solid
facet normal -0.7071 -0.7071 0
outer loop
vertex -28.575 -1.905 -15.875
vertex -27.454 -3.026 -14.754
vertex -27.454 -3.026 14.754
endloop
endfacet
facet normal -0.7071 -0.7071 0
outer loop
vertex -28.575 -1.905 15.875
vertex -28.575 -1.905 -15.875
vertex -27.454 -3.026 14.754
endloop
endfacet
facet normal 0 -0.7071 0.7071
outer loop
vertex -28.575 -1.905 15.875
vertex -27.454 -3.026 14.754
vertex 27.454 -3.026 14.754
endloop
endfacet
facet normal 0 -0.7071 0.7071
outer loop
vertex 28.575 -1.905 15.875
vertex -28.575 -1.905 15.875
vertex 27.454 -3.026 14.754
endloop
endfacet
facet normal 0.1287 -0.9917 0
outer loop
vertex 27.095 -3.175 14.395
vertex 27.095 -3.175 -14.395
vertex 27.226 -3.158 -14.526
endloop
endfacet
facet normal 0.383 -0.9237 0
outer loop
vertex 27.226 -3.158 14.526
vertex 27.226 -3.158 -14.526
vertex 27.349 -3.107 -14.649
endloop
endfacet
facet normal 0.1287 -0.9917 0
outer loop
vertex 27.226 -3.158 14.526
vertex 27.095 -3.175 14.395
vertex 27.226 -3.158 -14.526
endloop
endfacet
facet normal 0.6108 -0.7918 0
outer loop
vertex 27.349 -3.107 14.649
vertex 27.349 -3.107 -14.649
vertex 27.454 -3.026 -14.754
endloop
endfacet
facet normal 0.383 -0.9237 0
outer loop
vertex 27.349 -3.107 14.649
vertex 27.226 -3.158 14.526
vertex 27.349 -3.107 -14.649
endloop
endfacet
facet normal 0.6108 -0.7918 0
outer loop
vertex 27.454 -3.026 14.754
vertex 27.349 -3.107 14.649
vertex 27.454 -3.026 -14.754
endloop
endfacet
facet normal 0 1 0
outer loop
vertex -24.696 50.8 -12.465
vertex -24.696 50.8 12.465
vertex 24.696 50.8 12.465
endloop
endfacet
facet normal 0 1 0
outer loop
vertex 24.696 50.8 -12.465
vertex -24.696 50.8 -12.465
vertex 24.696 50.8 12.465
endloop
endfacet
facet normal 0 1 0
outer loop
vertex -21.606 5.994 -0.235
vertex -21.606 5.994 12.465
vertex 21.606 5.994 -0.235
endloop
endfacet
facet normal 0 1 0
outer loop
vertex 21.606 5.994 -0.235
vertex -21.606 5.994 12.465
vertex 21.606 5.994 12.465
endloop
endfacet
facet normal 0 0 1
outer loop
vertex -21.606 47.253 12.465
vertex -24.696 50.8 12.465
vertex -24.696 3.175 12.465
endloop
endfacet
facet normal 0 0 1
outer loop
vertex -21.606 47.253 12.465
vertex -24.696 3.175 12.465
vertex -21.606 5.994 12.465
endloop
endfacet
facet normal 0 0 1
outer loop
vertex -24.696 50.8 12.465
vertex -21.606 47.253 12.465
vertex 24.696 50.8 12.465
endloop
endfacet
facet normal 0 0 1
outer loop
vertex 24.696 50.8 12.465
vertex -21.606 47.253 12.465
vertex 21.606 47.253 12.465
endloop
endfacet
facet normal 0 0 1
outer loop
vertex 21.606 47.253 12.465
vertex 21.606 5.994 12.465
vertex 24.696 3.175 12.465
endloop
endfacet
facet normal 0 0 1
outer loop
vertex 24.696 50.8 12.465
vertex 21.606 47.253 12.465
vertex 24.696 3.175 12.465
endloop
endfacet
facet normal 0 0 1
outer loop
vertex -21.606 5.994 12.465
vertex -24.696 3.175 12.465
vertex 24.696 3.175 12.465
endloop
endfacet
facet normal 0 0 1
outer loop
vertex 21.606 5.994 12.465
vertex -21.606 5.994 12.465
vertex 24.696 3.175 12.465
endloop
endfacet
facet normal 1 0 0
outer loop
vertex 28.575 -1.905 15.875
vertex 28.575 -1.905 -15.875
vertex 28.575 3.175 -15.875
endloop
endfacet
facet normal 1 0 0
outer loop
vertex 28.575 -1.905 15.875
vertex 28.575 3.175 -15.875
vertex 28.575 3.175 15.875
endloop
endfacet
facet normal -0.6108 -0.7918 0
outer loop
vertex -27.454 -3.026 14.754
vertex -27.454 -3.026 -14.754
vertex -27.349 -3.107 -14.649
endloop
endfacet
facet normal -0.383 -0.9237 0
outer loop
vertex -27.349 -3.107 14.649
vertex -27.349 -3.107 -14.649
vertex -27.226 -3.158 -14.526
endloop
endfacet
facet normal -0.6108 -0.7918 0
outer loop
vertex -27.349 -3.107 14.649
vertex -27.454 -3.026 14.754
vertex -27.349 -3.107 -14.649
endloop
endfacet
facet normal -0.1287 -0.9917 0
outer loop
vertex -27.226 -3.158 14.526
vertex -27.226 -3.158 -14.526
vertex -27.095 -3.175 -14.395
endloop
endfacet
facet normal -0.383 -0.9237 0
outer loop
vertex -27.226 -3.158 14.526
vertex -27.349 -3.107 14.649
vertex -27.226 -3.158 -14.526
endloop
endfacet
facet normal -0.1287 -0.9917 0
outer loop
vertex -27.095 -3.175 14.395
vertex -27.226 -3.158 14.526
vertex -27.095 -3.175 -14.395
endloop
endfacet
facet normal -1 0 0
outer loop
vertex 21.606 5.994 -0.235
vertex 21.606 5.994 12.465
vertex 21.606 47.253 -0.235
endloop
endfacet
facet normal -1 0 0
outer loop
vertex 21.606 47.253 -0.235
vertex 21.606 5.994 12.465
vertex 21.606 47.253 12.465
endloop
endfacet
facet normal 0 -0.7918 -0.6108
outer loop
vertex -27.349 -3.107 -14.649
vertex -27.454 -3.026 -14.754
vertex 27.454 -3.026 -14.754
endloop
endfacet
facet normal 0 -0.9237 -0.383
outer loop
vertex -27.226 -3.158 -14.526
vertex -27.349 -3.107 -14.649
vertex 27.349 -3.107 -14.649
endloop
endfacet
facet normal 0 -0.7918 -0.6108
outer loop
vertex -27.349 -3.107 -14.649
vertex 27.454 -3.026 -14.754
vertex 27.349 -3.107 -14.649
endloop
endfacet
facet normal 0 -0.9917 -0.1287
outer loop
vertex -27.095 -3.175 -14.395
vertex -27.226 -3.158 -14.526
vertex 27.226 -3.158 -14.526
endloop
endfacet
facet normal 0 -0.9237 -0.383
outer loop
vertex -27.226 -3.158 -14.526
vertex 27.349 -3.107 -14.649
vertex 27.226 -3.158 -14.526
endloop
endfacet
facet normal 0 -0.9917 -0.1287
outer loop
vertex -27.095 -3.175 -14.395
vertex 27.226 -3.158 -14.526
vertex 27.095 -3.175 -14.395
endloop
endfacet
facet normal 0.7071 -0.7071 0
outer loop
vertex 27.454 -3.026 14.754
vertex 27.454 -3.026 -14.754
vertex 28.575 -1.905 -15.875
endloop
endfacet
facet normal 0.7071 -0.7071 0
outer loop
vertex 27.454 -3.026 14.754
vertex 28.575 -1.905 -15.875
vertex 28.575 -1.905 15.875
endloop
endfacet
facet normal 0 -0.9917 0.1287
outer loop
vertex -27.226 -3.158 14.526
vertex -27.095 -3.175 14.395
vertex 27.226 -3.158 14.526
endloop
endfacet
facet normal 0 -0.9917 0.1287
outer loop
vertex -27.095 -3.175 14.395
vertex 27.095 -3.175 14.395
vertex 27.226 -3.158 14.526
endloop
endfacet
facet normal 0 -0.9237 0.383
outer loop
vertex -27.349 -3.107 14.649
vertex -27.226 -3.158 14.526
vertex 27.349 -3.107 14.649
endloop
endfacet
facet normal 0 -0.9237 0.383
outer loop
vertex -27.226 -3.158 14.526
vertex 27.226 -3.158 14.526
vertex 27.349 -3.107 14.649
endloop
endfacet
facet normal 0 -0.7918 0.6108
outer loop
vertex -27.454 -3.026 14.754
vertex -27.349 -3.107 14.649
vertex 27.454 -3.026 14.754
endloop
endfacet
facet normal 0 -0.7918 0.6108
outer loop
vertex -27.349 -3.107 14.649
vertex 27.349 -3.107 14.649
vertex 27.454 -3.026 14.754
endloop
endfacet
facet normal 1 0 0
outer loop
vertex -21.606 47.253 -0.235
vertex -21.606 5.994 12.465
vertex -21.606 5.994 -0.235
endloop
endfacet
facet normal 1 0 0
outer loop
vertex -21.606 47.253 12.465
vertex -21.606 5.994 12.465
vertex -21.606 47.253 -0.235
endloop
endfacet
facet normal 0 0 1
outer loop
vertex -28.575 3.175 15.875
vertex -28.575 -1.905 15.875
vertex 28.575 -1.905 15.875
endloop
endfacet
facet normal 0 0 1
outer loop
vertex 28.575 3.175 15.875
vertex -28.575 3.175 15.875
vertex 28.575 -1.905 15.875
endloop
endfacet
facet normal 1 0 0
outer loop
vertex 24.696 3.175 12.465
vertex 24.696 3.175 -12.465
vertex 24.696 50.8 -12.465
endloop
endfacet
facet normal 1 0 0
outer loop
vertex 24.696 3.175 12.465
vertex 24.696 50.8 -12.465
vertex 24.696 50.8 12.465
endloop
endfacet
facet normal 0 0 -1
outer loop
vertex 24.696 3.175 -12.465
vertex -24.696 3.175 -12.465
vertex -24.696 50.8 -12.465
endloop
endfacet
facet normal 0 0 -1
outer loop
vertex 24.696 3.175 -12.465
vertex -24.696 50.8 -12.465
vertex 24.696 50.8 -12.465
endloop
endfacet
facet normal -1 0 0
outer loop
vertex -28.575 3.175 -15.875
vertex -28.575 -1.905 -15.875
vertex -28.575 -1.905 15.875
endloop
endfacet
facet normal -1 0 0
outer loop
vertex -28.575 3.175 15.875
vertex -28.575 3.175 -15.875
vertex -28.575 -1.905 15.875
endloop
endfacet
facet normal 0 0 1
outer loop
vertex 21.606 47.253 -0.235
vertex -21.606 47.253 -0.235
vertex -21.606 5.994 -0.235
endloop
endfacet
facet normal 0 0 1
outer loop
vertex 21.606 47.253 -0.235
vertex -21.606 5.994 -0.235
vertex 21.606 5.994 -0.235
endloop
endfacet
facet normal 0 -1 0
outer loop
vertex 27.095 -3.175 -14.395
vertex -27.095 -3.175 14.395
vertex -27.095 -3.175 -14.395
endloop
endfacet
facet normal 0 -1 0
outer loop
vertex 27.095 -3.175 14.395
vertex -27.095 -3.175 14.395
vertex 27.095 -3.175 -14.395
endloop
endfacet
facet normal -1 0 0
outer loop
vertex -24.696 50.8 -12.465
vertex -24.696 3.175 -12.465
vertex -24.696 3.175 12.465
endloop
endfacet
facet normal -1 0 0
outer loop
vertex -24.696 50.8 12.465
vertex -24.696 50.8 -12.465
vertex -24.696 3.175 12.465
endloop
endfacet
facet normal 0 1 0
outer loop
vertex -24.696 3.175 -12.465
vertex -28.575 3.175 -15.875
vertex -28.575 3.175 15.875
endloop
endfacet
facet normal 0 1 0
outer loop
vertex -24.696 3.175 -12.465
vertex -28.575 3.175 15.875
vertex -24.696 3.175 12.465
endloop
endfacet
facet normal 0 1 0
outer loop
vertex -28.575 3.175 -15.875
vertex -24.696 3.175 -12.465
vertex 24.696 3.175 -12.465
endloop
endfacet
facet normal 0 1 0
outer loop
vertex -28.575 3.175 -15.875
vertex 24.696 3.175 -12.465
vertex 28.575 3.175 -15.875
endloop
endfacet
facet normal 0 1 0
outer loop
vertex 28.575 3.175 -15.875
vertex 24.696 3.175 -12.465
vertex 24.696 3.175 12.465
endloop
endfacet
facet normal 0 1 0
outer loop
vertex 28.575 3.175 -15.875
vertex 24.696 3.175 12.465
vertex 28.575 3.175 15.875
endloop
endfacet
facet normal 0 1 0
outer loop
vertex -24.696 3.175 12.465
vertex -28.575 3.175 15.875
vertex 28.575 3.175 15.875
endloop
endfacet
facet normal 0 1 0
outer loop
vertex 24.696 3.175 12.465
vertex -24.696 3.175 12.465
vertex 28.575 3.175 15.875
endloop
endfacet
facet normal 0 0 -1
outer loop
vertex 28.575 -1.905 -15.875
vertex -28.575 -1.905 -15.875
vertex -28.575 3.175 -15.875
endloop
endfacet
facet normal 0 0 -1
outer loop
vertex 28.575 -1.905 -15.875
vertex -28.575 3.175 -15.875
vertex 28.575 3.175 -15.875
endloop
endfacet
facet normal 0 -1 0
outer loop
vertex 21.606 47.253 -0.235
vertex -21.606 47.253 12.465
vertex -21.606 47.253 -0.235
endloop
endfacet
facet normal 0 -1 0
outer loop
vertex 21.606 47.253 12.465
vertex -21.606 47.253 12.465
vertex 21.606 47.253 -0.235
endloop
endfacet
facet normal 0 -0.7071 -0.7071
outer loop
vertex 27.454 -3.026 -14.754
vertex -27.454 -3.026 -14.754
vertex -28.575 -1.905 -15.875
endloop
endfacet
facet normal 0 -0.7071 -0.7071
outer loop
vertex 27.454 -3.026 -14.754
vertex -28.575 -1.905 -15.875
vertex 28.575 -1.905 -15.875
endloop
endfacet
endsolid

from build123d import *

# Parameters (mm, degrees)
F0_W     = 57.15
F0_H     = 31.75
F1_DEPTH = 3.175
F2_W     = 49.392026
F2_H     = 24.930672
F3_DEPTH = 50.8
F4_W     = 43.211122
F4_H     = 41.259654
F5_DEPTH = 12.7
F6_SIZE  = 1.27
F7_R     = 0.508


with BuildPart() as f1:
    # F0 (on Front) → F1 (new body, symmetric)
    with BuildSketch(Plane.XZ):
        Rectangle(F0_W, F0_H)
    extrude(amount=F1_DEPTH, both=True)

    # F2 (on Front) → F3 (join)
    with BuildSketch(Plane.XZ):
        Rectangle(F2_W, F2_H)
    extrude(amount=-F3_DEPTH)

    # F4 (on face) → F5 (cut)
    with BuildSketch(Plane.XY.offset(12.465336)):
        with Locations((0, 26.623629)):
            Rectangle(F4_W, F4_H)
    extrude(amount=-F5_DEPTH, mode=Mode.SUBTRACT)

    # F6
    f6_edges = [f1.edges().sort_by_distance(p)[0] for p in [
        (0, -3.175, -15.875),
        (-28.575, -3.175, 0),
        (28.575, -3.175, 0),
        (0, -3.175, 15.875),
    ]]
    chamfer(f6_edges, length=F6_SIZE)

    # F7
    f7_edges = [f1.edges().sort_by_distance(p)[0] for p in [
        (0, -3.175, -14.605),
        (-27.305, -3.175, 0),
        (27.305, -3.175, 0),
        (0, -3.175, 14.605),
    ]]
    fillet(f7_edges, radius=F7_R)


solid = f1.part
